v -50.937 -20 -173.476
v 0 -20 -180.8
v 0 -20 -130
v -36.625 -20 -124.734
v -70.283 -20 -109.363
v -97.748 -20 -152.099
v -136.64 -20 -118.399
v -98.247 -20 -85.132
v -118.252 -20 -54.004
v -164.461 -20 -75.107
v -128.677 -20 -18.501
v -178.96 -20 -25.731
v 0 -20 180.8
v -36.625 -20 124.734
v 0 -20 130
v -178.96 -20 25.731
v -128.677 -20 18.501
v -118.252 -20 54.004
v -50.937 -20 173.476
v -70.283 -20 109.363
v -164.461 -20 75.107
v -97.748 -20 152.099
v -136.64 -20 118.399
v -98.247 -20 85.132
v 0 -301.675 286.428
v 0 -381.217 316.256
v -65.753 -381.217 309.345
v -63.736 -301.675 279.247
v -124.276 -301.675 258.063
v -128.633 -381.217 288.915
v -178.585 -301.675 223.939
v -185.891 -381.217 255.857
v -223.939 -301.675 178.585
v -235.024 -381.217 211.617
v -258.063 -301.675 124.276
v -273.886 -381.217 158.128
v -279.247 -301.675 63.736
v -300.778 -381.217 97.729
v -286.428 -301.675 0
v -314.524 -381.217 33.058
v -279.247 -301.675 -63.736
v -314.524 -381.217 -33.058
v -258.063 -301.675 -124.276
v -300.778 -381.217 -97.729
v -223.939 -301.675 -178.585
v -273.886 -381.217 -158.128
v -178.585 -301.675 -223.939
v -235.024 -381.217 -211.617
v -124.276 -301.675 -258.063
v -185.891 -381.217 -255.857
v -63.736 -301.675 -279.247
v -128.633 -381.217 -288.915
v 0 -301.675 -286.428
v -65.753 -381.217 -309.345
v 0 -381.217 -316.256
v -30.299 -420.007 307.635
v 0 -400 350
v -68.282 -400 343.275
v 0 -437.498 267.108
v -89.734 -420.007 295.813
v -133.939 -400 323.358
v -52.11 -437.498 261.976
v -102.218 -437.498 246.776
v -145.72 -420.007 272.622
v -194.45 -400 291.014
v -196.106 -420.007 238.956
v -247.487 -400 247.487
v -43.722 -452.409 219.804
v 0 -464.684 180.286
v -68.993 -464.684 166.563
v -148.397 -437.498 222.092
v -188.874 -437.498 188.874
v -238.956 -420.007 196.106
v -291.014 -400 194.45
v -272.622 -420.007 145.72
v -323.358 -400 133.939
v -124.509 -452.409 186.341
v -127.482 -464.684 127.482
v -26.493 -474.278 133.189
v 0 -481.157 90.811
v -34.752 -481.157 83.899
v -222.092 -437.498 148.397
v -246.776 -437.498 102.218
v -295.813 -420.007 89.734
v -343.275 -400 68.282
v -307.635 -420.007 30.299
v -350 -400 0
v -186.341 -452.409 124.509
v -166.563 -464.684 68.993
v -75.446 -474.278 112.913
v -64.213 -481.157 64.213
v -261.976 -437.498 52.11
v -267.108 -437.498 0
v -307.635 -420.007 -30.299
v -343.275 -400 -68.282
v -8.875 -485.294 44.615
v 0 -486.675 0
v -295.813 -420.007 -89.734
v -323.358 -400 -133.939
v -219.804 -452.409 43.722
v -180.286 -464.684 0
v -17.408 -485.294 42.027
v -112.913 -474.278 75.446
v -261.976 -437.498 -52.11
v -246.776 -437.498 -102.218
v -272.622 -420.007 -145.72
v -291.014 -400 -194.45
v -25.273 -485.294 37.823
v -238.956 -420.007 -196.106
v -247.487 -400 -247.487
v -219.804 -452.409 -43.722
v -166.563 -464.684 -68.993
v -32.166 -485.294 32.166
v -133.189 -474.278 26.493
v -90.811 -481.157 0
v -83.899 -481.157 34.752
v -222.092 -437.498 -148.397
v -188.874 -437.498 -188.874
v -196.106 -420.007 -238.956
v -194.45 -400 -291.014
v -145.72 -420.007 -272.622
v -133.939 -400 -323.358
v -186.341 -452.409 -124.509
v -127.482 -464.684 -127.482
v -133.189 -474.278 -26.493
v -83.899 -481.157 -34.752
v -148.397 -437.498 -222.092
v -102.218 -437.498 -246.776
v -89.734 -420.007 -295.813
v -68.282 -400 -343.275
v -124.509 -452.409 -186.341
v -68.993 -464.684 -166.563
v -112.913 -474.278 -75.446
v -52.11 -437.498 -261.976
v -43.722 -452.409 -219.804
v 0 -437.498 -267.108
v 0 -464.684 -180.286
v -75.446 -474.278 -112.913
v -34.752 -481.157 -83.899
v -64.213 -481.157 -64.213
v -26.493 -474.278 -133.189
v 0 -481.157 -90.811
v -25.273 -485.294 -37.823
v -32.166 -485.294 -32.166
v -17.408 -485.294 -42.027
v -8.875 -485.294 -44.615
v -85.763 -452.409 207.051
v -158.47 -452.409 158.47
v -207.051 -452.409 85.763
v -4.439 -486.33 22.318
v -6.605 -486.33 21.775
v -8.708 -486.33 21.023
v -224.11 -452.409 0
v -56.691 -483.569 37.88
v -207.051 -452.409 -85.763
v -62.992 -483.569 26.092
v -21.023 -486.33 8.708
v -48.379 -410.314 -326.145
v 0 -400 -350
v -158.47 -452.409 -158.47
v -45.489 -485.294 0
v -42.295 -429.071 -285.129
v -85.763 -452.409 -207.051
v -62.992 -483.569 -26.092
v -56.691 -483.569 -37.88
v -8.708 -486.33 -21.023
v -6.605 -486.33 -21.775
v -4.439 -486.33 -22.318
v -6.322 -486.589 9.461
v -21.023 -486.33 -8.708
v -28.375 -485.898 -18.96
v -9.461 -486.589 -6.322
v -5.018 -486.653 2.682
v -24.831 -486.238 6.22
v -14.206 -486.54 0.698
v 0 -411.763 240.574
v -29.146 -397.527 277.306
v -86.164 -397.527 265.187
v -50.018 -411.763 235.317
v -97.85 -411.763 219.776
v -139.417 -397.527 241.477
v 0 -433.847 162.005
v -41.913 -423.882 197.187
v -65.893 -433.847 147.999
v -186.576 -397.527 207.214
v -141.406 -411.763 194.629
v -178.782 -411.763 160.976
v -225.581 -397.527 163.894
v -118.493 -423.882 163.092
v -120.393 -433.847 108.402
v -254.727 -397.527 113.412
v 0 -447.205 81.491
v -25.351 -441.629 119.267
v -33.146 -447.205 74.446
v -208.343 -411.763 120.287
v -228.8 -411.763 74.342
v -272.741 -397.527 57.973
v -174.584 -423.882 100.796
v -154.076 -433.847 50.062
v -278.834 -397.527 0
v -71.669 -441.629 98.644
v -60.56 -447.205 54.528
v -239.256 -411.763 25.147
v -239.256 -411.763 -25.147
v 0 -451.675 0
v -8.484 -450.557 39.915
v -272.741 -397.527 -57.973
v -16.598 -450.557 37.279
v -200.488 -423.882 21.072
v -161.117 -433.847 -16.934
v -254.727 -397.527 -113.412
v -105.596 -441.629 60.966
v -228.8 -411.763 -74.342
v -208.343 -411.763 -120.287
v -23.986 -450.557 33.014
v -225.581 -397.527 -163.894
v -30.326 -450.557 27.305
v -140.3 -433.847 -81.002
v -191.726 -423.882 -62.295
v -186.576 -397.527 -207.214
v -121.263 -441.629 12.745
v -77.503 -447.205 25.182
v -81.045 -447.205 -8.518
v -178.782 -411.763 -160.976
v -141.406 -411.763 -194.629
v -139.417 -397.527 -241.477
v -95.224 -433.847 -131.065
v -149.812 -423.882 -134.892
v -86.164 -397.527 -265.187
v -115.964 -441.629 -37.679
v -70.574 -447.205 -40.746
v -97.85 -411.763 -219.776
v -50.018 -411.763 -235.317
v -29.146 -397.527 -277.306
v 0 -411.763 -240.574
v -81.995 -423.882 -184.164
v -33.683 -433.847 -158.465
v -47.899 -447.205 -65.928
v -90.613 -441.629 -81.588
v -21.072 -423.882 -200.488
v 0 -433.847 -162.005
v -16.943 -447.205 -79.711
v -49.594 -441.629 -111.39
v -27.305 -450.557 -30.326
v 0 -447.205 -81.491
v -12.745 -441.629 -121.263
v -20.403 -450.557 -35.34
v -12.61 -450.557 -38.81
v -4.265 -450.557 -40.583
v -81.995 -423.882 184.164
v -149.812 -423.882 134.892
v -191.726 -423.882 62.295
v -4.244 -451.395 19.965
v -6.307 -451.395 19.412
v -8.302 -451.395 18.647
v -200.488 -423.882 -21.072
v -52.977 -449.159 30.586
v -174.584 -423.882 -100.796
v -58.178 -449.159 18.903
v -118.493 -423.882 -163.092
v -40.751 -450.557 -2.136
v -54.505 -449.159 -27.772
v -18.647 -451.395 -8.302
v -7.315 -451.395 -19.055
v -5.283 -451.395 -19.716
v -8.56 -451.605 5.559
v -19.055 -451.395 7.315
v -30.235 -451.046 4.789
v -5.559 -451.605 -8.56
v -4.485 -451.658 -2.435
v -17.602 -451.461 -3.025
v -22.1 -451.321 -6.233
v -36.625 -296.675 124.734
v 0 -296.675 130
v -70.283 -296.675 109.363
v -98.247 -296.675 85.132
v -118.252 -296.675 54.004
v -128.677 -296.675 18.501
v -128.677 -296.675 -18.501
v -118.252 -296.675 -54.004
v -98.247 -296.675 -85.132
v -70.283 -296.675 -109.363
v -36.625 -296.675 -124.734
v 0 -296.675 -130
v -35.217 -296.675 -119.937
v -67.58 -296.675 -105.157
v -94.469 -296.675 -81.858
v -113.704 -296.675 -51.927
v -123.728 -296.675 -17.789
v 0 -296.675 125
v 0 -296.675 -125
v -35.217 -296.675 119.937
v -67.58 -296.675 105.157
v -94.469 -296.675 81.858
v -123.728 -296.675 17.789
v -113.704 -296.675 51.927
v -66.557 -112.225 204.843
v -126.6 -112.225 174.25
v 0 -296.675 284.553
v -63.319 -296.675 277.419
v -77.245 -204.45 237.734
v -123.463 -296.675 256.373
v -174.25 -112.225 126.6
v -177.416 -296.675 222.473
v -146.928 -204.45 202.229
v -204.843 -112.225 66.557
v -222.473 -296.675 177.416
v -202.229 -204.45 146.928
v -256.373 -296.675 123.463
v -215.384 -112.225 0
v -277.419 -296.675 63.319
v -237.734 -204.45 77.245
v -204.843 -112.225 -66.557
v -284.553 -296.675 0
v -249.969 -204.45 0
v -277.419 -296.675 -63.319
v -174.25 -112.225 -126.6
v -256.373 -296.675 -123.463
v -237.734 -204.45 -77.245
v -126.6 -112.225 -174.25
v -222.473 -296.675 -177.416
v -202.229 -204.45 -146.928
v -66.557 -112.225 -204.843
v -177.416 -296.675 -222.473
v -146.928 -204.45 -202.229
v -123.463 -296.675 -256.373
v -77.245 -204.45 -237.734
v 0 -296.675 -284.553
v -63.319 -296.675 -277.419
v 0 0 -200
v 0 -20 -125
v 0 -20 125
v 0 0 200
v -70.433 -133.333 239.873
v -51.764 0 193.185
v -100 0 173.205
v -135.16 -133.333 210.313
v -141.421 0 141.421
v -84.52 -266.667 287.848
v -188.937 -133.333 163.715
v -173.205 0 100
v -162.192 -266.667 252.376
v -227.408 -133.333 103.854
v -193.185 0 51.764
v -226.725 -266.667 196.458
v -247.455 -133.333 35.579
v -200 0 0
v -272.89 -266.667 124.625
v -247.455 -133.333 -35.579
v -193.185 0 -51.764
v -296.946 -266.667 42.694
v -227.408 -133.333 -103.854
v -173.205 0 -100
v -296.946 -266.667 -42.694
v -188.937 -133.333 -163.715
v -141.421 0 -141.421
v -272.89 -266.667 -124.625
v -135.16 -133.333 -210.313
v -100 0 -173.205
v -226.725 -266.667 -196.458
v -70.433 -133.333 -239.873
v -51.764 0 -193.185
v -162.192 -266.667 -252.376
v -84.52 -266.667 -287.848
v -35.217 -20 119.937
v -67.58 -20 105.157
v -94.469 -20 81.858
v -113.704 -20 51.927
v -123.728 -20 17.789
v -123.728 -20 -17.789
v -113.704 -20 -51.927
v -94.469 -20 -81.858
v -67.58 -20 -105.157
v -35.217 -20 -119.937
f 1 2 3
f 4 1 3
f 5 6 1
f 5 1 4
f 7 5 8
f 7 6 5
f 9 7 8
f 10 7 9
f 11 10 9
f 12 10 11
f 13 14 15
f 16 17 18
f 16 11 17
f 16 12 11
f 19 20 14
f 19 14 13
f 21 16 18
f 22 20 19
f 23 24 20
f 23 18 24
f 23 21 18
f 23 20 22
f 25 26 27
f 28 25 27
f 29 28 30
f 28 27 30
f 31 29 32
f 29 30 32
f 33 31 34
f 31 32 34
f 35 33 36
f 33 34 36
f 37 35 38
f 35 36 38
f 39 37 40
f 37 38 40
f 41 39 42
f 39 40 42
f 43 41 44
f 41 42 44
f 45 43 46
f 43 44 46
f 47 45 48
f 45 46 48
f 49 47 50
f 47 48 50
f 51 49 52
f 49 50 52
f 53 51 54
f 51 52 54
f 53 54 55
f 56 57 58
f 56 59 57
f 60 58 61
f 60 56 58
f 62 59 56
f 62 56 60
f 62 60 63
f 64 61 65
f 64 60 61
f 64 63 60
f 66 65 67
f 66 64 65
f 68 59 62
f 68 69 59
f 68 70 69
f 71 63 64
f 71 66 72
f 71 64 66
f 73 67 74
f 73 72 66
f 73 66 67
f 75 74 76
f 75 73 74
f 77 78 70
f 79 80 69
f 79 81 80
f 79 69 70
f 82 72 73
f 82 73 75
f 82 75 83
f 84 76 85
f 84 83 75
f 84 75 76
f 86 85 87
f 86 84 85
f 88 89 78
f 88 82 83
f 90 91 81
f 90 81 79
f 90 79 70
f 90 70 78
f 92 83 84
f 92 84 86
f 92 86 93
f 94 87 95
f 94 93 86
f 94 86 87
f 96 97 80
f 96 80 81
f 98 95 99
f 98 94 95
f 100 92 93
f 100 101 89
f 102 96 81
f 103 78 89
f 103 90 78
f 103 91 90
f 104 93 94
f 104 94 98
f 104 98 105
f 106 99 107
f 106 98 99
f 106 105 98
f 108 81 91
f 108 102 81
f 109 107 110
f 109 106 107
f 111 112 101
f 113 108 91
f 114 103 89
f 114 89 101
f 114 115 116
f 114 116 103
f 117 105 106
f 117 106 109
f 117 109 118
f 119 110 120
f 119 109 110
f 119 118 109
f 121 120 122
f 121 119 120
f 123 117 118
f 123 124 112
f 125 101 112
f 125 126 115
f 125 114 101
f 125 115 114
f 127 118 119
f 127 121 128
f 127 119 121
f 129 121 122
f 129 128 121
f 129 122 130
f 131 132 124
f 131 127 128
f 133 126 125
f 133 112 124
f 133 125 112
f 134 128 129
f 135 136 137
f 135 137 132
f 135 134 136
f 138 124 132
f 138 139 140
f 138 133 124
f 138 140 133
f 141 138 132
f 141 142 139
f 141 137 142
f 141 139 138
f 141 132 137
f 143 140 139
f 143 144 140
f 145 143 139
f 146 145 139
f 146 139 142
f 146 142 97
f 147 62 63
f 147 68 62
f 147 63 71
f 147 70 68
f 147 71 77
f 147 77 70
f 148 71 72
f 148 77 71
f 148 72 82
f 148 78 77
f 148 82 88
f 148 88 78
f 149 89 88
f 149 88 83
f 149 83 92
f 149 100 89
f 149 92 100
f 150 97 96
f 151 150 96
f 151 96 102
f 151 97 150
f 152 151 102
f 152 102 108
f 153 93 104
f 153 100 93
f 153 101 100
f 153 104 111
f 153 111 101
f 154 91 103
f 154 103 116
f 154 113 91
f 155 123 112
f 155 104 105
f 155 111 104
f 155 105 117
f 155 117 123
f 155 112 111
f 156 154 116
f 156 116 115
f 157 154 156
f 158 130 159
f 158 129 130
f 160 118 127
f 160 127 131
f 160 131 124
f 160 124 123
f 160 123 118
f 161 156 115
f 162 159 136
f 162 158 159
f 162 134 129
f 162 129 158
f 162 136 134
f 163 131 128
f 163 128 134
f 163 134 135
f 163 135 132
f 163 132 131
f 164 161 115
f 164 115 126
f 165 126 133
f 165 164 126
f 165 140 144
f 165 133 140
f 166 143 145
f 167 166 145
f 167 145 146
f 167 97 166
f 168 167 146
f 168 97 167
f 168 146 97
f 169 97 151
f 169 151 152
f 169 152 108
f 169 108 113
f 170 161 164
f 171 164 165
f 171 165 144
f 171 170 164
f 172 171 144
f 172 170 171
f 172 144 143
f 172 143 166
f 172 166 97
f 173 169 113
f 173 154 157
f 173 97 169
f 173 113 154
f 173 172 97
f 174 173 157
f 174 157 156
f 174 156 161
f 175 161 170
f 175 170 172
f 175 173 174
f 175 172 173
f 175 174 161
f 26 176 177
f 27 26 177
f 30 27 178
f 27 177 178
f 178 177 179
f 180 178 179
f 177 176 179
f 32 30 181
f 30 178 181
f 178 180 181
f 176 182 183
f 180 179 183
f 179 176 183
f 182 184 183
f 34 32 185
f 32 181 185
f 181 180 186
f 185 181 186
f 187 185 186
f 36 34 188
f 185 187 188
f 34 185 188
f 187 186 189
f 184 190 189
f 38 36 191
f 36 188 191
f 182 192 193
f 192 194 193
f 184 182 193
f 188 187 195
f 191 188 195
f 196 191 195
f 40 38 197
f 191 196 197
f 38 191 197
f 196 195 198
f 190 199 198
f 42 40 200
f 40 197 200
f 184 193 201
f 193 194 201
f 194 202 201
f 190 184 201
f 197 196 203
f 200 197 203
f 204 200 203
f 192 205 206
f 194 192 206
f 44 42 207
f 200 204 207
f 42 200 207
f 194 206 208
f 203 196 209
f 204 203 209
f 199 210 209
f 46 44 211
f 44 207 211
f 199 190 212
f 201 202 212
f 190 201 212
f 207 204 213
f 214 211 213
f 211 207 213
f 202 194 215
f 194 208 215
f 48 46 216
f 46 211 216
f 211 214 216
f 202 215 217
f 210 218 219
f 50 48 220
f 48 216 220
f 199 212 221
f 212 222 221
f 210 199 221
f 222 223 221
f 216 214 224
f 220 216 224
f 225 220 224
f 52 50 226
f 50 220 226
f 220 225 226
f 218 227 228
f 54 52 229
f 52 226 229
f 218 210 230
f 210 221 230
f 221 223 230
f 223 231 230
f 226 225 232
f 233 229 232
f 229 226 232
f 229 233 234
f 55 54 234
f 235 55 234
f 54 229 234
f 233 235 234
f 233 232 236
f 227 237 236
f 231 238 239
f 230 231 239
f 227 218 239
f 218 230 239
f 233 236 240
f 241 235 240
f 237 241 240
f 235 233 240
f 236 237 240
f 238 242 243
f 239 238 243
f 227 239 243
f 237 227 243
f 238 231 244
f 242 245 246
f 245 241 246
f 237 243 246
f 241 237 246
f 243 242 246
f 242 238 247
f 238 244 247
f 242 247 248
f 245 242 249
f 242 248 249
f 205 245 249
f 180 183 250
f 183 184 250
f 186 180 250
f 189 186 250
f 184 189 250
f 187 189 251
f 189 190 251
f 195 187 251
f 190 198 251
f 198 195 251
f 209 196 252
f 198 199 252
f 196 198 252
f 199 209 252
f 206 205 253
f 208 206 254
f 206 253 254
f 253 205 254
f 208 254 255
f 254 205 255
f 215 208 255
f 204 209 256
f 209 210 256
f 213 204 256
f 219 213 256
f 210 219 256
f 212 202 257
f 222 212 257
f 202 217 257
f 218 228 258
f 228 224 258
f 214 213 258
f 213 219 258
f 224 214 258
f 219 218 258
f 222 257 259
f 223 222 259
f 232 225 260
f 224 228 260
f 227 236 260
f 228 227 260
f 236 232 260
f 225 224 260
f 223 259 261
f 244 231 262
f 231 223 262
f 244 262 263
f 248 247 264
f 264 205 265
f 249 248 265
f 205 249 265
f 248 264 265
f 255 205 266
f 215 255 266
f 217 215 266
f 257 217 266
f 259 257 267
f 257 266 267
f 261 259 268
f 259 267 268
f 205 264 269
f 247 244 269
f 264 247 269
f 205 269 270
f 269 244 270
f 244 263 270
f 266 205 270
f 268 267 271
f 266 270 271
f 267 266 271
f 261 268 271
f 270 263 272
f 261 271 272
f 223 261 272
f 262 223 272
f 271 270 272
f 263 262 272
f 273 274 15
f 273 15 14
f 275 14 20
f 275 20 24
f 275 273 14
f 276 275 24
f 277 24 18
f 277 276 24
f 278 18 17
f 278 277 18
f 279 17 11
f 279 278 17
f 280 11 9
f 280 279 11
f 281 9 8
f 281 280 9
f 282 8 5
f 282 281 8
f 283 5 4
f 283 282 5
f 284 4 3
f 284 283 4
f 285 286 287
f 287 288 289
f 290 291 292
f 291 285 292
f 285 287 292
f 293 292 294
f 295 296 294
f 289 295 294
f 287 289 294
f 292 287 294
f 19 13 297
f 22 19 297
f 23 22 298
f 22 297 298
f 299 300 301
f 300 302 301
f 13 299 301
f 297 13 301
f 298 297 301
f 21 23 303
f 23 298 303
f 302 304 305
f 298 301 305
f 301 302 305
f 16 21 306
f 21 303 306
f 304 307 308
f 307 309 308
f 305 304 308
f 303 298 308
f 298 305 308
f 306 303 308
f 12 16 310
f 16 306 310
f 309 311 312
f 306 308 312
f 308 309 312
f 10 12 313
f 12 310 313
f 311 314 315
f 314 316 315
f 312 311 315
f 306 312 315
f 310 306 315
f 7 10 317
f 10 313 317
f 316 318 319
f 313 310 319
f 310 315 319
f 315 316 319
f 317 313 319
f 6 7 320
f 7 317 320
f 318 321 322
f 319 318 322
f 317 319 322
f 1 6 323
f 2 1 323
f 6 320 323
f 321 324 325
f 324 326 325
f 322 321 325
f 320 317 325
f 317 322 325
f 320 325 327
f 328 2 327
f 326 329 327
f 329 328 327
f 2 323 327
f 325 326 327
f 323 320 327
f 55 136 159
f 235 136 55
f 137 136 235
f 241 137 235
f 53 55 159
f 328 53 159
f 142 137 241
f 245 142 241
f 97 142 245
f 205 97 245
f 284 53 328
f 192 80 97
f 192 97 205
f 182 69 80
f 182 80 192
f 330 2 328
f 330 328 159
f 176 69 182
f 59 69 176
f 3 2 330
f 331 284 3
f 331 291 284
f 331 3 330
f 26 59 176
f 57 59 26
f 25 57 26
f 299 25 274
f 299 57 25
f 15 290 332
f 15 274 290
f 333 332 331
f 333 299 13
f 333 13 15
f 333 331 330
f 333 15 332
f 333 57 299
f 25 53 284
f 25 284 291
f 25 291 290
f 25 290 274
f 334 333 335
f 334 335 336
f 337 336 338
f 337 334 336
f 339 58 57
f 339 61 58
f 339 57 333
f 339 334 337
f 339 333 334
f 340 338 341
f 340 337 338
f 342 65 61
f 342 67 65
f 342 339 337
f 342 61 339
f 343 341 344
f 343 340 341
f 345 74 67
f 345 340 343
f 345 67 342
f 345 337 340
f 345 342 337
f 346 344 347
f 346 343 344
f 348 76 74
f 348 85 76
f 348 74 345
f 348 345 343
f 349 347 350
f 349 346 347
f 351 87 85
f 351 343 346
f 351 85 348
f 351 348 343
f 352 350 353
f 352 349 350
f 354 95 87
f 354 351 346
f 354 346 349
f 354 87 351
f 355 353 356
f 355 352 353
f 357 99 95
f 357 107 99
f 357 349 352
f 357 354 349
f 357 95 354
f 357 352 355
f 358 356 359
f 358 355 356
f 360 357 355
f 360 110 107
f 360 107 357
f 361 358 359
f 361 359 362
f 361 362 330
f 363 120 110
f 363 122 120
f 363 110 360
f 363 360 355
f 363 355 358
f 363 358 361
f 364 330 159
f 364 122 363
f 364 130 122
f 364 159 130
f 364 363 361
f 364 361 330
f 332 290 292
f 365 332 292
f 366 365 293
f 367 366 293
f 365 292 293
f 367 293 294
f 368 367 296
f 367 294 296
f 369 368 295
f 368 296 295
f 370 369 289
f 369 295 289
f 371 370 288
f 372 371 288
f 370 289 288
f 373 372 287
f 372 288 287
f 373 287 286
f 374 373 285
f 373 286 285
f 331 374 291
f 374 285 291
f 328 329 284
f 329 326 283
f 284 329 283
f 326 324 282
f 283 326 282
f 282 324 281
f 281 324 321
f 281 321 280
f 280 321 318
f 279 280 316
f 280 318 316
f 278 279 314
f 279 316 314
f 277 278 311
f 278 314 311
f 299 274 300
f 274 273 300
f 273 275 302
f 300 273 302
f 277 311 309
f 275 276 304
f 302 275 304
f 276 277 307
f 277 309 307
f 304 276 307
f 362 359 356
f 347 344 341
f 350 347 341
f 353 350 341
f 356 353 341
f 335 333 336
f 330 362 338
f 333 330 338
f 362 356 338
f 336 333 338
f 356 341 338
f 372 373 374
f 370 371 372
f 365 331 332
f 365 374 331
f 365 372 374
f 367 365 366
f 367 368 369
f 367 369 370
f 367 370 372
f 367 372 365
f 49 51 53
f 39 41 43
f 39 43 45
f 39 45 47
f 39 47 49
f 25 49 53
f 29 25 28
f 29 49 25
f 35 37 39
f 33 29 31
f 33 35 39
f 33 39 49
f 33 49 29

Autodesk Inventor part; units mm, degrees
ref_plane "YZ Plane" through (0, 0, 0) normal (1, 0, 0) x (0, 1, 0)
ref_plane "XZ Plane" through (0, 0, 0) normal (0, 1, 0) x (-1, 0, 0)
ref_plane "XY Plane" through (0, 0, 0) normal (0, 0, 1) x (1, 0, 0)
sketch "スケッチ1" plane through (0, 0, 0) normal (1, 0, 0) x (0, 1, 0)
  line L0 (0, 0) -> (0, 200)
  line L1 (0, 200) -> (-400, 350)
  arc A0 (-400, 350) -> (-486.675, 0) centre (263.325, 0) ccw
  line L2 (-668.2907, 0) -> (453.5942, 0) projected
  line L3 (0, 0) -> (-20, 0)
  line L4 (-20, 0) -> (-20, 180.8)
  line L5 (-20, 180.8) -> (-381.217, 316.2564)
  arc A1 (-381.217, 316.2564) -> (-451.675, 0) centre (293.325, 0) ccw
  line L6 (-451.675, 0) -> (-486.675, 0)
  dimension "d0" = 200
  dimension "d1" = 400
  dimension "d2" = 750
  dimension "d3" = 350
  dimension "d9" = 20
  dimension "d10" = 25
  dimension "d11" = 30
  dimension "d12" = 35
revolve "回転2" add sketch "スケッチ1" angle 180 about axis through (0, -10, 0) along (0, -1, 0) contours L2 L4 L5 A1 A0 L1 L0
sketch "スケッチ2" plane through (0, 263.325, 0) normal (1, 0, 0) x (0, 0, -1)
  line L0 (-284.5531, -560) -> (0, -560)
  line L1 (0, -560) -> (0, -565)
  line L2 (0, -565) -> (-286.4281, -565)
  line L3 (-286.4281, -565) -> (-284.5531, -560)
  line L4 (-316.2564, -644.542) -> (-180.8, -283.325) projected
  arc A0 (-316.2564, -644.542) -> (0, -715) centre (0, 30) ccw projected
  line L5 (0, -906) -> (0, 186) projected
  point P0 (0, -263.325)
  dimension "d14" = 5
  dimension "d15" = 150
revolve "回転3" add sketch "スケッチ2" angle 180 about axis through (0, -10, 0) along (0, -1, 0) contours L0 L1 L2 L3
sketch "スケッチ3" plane through (0, 263.325, 0) normal (1, 0, 0) x (0, 0, -1)
  line L0 (-180.8, -283.325) -> (180.8, -283.325) projected
  line L1 (-284.5531, -560) -> (284.5531, -560) projected
  line L2 (-130, -283.325) -> (-130, -560)
  line L3 (-125, -283.325) -> (-125, -560)
  line L4 (0, -847.335) -> (0, -165.9899) projected
  line L5 (-130, -283.325) -> (-125, -283.325)
  line L6 (-130, -560) -> (-125, -560)
  line L7 (-284.5531, -560) -> (284.5531, -560) projected
  point P0 (0, -263.325)
  dimension "d17" = 5
  dimension "d18" = 125
revolve "回転4" add sketch "スケッチ3" angle 180 about axis through (0, -10, 0) along (0, -1, 0) contours L0 L3 L1 L2
properties part number "hakoooo"
